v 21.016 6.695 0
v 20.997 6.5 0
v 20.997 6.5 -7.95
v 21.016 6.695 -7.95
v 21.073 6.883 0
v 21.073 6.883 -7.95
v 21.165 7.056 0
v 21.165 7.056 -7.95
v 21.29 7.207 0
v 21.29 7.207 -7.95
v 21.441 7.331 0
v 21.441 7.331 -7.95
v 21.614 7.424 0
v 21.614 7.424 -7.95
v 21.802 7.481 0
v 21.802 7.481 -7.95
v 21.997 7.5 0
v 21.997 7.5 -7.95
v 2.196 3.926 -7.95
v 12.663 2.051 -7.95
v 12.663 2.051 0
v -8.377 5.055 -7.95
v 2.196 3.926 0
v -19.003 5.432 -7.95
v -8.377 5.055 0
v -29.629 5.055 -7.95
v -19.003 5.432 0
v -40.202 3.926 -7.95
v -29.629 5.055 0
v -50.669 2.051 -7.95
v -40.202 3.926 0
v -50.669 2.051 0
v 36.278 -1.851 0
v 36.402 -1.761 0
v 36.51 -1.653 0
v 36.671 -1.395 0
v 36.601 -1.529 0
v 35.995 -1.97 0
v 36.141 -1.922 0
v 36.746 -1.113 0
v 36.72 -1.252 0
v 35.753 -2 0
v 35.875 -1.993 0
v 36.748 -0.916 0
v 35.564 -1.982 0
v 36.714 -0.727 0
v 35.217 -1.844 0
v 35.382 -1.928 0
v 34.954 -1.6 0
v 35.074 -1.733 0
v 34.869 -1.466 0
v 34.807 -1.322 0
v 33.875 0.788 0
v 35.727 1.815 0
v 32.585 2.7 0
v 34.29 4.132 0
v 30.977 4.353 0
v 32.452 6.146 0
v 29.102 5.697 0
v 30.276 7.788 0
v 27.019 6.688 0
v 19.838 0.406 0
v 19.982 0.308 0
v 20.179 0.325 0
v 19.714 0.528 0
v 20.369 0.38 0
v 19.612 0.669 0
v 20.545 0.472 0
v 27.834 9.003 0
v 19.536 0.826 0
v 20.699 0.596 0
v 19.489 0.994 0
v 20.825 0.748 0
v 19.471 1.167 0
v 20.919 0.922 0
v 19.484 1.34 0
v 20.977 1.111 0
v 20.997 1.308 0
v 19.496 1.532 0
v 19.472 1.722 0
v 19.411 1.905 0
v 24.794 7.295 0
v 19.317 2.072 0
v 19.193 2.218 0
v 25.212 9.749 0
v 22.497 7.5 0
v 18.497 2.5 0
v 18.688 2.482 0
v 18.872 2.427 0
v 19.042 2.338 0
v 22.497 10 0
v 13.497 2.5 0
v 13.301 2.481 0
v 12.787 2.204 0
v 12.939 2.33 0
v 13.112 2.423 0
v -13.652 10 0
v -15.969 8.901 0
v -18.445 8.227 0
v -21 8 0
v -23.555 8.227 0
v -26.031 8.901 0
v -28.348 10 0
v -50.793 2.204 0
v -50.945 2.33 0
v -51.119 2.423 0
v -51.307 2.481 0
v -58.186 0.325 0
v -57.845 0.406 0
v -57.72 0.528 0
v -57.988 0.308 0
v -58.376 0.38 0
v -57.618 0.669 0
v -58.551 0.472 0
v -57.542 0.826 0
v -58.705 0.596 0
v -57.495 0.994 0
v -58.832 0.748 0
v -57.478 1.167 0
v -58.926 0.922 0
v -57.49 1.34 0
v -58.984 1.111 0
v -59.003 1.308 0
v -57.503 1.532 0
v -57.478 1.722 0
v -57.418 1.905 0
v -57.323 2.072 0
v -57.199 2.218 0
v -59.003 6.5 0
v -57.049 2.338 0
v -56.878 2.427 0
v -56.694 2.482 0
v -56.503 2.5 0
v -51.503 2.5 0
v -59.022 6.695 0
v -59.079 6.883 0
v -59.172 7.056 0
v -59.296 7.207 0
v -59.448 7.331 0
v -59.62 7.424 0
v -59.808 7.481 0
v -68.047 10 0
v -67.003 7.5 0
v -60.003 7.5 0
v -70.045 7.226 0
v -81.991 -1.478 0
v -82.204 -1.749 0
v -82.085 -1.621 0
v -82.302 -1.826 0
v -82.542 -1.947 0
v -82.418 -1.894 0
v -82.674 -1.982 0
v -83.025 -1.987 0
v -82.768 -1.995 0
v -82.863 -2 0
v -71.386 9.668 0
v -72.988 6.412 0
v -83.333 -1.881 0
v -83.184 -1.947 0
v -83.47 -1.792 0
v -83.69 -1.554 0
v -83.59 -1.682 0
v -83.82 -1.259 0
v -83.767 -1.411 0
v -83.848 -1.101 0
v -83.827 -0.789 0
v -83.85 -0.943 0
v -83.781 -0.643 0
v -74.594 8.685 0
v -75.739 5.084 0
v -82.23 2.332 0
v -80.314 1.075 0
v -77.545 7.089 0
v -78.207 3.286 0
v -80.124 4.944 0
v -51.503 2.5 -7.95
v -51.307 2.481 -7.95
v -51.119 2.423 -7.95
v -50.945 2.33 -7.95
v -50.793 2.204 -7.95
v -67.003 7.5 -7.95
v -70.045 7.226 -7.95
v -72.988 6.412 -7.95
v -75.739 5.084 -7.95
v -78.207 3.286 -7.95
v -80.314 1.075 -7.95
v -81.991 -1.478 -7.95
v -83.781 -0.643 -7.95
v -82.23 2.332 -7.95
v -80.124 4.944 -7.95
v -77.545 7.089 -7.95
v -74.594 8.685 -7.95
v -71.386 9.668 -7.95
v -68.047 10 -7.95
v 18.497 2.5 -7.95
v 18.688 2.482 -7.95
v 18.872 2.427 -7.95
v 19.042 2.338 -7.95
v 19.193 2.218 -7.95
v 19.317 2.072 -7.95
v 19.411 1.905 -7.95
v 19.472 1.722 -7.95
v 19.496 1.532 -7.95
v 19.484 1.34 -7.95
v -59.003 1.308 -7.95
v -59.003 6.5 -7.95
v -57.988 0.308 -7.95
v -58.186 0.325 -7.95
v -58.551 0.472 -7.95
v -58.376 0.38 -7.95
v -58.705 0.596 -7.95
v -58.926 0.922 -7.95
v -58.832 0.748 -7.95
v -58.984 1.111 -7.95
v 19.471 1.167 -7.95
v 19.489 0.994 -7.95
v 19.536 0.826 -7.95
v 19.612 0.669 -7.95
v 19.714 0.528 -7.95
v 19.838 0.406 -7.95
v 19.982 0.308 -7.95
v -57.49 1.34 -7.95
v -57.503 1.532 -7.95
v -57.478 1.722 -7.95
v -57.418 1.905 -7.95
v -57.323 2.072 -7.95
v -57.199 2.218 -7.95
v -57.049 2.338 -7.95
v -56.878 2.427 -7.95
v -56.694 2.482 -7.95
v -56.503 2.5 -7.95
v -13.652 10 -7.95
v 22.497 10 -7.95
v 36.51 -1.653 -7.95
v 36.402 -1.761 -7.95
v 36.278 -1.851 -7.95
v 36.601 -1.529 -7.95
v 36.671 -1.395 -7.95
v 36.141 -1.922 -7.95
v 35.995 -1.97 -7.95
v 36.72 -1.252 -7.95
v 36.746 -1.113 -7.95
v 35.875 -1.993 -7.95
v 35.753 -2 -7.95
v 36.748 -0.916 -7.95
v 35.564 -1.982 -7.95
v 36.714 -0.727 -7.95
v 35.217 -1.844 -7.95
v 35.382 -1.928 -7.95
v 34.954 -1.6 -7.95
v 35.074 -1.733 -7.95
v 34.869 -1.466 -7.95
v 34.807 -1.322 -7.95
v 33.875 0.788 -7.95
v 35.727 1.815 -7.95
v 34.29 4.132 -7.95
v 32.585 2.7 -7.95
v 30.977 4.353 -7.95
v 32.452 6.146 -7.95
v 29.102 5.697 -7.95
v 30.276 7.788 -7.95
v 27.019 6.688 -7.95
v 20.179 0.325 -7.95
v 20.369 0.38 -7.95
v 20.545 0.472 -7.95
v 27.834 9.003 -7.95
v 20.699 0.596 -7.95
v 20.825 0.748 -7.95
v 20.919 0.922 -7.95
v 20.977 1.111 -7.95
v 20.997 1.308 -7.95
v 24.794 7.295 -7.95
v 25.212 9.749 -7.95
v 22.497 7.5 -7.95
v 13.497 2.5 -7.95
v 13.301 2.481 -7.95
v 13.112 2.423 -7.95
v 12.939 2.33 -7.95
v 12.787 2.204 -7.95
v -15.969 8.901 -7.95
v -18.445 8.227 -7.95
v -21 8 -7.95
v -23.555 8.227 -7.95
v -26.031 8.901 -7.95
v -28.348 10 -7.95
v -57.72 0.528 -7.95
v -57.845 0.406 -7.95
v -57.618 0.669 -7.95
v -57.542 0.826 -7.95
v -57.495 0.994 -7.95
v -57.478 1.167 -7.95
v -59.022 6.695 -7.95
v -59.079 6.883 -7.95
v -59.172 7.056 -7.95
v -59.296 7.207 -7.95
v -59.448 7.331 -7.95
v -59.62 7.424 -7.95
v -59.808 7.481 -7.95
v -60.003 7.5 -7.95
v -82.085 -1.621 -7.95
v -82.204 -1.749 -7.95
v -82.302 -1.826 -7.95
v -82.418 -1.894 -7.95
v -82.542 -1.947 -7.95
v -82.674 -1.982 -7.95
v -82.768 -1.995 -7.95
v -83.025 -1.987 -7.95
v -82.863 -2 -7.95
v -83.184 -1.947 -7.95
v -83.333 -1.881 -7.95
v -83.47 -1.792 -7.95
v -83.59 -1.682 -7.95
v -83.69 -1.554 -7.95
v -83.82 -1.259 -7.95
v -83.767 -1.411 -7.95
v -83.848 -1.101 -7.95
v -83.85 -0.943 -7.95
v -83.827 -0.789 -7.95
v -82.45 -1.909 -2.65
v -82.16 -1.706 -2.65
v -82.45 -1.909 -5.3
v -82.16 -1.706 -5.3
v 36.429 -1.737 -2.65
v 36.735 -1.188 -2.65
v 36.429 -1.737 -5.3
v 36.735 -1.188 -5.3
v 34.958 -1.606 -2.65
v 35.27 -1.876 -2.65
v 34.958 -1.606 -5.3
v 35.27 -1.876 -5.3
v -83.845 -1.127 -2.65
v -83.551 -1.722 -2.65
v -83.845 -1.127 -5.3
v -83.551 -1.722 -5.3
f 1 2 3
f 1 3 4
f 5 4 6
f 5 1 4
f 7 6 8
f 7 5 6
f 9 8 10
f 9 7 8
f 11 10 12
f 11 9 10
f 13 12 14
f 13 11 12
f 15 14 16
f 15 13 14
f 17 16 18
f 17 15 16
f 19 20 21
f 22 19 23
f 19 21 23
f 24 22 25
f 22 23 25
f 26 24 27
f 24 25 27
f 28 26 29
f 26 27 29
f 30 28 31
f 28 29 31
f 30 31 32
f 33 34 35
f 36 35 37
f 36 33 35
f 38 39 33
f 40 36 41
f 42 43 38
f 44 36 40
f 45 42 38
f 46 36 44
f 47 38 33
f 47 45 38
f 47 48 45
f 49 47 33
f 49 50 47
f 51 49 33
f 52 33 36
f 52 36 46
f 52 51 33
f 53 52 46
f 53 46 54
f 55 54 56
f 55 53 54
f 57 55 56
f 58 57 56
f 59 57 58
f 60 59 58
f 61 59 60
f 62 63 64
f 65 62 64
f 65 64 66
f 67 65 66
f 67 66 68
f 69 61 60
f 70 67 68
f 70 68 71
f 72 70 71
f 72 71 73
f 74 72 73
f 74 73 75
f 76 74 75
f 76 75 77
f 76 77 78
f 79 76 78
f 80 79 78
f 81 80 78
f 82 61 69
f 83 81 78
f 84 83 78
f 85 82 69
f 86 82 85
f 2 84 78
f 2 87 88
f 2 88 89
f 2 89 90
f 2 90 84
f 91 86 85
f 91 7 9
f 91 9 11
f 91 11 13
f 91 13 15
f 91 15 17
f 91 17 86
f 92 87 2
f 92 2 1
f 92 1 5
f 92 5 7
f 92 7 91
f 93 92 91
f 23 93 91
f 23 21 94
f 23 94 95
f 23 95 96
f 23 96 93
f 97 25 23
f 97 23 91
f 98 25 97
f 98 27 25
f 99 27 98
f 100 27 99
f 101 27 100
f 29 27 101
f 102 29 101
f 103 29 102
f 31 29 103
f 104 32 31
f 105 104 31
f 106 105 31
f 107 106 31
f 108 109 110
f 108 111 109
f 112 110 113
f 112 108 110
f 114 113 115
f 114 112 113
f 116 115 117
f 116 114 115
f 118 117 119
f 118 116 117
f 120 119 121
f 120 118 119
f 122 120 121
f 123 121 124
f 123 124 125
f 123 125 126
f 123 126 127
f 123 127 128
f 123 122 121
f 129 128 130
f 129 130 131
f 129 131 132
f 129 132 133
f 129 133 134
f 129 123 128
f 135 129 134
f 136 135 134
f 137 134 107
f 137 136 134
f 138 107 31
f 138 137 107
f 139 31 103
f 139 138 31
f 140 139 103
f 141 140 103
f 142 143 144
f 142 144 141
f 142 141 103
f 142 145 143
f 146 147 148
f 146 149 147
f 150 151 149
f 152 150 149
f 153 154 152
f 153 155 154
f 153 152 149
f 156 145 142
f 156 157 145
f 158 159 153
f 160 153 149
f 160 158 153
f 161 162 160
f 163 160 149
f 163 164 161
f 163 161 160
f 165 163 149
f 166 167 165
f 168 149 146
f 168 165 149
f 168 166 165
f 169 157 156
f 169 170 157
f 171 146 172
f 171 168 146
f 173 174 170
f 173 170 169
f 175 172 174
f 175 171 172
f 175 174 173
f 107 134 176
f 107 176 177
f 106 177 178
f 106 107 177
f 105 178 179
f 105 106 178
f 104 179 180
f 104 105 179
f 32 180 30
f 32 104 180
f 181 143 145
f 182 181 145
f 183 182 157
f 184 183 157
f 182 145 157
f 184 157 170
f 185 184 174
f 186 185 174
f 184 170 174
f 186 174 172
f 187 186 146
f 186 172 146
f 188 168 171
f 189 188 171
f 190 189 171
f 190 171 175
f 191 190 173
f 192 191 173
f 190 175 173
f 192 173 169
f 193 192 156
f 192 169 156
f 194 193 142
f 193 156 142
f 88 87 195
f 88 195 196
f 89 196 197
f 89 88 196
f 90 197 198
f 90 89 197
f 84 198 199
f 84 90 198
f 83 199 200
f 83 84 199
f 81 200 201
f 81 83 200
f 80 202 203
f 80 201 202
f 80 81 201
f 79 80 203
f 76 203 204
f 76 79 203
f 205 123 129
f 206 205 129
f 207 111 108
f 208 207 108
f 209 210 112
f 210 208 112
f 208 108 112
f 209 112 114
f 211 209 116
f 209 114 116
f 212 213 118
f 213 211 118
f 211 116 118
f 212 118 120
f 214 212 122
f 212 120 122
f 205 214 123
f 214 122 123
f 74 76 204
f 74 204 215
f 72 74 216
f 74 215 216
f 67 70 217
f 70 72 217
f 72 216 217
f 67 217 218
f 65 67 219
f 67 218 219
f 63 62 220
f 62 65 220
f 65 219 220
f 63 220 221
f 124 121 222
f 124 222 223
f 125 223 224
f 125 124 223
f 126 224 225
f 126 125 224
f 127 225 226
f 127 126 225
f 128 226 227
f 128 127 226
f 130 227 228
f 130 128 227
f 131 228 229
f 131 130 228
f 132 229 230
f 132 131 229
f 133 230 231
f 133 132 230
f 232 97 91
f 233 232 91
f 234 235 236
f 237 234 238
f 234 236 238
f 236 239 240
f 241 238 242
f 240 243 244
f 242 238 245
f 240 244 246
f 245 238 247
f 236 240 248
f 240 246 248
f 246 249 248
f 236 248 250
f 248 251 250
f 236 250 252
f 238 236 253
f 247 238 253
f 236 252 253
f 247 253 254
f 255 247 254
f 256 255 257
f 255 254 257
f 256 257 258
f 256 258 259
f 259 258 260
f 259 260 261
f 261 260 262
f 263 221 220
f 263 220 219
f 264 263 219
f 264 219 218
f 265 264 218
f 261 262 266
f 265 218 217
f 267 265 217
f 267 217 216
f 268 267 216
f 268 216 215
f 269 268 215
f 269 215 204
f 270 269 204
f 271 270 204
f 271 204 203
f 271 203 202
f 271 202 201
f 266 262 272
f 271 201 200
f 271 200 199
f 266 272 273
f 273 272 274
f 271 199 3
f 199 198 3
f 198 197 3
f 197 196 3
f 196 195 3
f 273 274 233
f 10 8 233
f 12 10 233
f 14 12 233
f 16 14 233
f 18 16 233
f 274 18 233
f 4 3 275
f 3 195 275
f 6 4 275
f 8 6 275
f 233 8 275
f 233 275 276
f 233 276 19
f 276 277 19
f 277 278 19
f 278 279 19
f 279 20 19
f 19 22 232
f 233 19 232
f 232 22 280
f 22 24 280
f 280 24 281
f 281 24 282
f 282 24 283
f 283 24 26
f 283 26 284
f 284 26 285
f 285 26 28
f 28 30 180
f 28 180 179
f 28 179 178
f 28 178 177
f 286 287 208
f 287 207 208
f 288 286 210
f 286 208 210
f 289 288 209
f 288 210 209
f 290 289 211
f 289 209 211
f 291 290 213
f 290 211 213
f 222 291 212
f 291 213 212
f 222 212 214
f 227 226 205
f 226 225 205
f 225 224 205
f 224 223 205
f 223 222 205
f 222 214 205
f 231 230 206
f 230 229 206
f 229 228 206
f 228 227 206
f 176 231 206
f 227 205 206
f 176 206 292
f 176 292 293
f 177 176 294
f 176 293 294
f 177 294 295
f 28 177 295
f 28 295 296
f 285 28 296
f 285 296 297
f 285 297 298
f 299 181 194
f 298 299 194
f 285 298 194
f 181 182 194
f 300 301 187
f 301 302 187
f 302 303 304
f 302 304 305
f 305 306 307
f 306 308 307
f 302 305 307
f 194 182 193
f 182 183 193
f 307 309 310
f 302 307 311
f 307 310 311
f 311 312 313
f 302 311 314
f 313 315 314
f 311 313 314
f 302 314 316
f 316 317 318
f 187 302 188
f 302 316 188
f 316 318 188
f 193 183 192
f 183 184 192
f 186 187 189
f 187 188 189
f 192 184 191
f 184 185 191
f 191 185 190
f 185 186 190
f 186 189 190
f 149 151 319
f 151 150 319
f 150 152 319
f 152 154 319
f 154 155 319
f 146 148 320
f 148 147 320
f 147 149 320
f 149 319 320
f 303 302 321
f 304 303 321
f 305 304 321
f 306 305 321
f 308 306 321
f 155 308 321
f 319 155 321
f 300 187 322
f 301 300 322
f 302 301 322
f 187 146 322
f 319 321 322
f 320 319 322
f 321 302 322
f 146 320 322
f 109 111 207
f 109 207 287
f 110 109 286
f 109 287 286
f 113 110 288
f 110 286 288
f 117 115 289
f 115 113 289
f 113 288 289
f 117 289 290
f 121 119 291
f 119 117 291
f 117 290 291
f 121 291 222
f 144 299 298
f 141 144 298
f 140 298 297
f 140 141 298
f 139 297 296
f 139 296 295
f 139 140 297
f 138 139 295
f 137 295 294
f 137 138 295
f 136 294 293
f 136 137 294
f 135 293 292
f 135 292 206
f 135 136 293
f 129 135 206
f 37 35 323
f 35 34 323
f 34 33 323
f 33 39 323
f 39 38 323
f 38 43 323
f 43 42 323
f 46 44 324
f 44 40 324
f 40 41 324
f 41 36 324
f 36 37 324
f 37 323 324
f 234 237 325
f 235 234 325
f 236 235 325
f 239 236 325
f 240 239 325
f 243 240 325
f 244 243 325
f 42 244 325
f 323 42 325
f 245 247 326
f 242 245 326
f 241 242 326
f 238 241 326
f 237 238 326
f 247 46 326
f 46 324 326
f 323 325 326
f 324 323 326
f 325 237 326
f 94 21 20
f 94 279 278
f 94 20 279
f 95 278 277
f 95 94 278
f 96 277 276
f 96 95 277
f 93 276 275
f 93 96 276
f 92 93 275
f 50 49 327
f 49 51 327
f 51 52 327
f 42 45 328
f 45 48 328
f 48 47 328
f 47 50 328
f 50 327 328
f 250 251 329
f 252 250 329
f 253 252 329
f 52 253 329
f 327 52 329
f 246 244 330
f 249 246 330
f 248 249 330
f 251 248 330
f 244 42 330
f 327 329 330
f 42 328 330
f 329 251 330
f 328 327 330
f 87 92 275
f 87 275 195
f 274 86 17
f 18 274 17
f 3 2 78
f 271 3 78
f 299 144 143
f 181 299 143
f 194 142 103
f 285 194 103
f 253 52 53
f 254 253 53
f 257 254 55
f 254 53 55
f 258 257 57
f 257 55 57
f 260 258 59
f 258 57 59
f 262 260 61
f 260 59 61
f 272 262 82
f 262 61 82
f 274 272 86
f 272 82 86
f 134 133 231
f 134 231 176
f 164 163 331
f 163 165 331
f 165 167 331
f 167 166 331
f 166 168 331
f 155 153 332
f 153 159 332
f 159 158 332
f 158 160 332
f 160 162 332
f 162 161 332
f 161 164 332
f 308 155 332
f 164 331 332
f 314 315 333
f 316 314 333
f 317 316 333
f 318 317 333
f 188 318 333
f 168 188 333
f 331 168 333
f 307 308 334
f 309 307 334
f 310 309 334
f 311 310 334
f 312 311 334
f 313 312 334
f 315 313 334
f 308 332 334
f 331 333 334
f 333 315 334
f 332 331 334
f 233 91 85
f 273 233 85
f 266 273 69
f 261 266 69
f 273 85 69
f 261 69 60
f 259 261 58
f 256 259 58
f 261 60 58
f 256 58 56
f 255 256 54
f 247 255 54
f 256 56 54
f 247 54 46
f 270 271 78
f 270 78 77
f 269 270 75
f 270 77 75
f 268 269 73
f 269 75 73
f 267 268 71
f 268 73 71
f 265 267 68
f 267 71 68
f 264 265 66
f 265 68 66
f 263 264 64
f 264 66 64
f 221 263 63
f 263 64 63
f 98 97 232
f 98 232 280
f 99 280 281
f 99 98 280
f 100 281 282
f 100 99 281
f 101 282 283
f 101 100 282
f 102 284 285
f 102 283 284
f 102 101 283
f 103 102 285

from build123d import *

# Parameters (mm, degrees)
EXTRUDE_1219_DEPTH     = 7.95
CUT_EXTRUDE_1748_DEPTH = 86.222223289
FILLET_1_R             = 1
CUT_EXTRUDE_3045_DEPTH = 86.222223289
FILLET_START           = -9
FILLET_2_DEPTH         = 10
FILLET_3_DEPTH         = 10


with BuildPart() as part:
    # Эскиз1 → Extrude 1219 (new body)
    with BuildSketch(Plane.XY):
        with BuildLine():
            Line((-59.003125249, 0), (-59.003125249, 7.5))
            Line((-59.003125249, 7.5), (-67.003125249, 7.5))
            ThreePointArc((-67.003125249, 7.5), (-75.989225627, 4.93086969), (-82.259271551, -2))
            Line((-82.259271551, -2), (-84.259271551, -2))
            ThreePointArc((-84.259271551, -2), (-78.132206164, 6.673633304), (-68.047161318, 10))
            Line((-68.047161318, 10), (0, 10))
            Line((0, 10), (22.496874751, 10))
            ThreePointArc((22.496874751, 10), (31.915339808, 6.61174951), (37.016858777, -2))
            Line((37.016858777, -2), (35.016858777, -2))
            ThreePointArc((35.016858777, -2), (30.354991574, 4.856157589), (22.496874751, 7.5))
            Line((22.496874751, 7.5), (20.996874751, 7.5))
            Line((20.996874751, 7.5), (20.996874751, 0))
            ThreePointArc((20.996874751, 0), (-19.003125249, 5.431677052), (-59.003125249, 0))
        make_face()
    extrude(amount=-EXTRUDE_1219_DEPTH)

    # Эскиз4 → Cut-Extrude 1748 (cut, through all)
    with BuildSketch(Plane.XY):
        with BuildLine():
            Line((-56.503125249, 2.5), (-51.503125249, 2.5))
            ThreePointArc((-51.503125249, 2.5), (-50.503125249, 1.5), (-51.503125249, 0.5))
            Line((-51.503125249, 0.5), (-56.503125249, 0.5))
            ThreePointArc((-56.503125249, 0.5), (-57.503125249, 1.5), (-56.503125249, 2.5))
        make_face()
        with BuildLine():
            Line((13.496874751, 2.5), (18.496874751, 2.5))
            ThreePointArc((18.496874751, 2.5), (19.496874751, 1.5), (18.496874751, 0.5))
            Line((18.496874751, 0.5), (13.496874751, 0.5))
            ThreePointArc((13.496874751, 0.5), (12.496874751, 1.5), (13.496874751, 2.5))
        make_face()
    extrude(amount=-CUT_EXTRUDE_1748_DEPTH, mode=Mode.SUBTRACT)

    # Скругление1
    # the kernel refuses this fillet: 1 mm, written as the material it adds along each edge
    with BuildSketch(Plane(origin=(20.996874751, 7.5, 0), x_dir=(0, -1, 0), z_dir=(0, 0, -1))) as fillet_1_piece_1:
        with BuildLine():
            CenterArc((FILLET_1_R, -FILLET_1_R), FILLET_1_R, 90, 90)
            Line((0, -FILLET_1_R), (0, 0))
            Line((0, 0), (FILLET_1_R, 0))
        make_face()
    extrude(amount=7.95)
    with BuildSketch(Plane(origin=(-59.003125249, 7.5, 0), x_dir=(0, -1, 0), z_dir=(0, 0, -1))) as fillet_1_piece_2:
        with BuildLine():
            CenterArc((FILLET_1_R, FILLET_1_R), FILLET_1_R, 180, 90)
            Line((0, FILLET_1_R), (0, 0))
            Line((0, 0), (FILLET_1_R, 0))
        make_face()
    extrude(amount=7.95)
    # the kernel refuses this fillet: 1 mm, written as the material it takes off along each edge
    with BuildSketch(Plane(origin=(20.996874751, 0, 3.270843206), x_dir=(-0.9649388241572373, 0.26247488572061173, 0), z_dir=(0, 0, -1))) as fillet_1_2_piece_1:
        with BuildLine():
            CenterArc((1.308344503, 0.999990553), FILLET_1_R, 164.783036074, 104.967917899)
            Line((0.343405679, 1.262465439), (0, 0))
            ThreePointArc((0, 0), (0.651998922, 0.001417015), (1.303997843, 0))
        make_face()
    extrude(amount=14.491686412, mode=Mode.SUBTRACT)
    with BuildSketch(Plane(origin=(-59.003125249, 0, 3.270843206), x_dir=(0, 1, 0), z_dir=(0, 0, -1))) as fillet_1_2_piece_2:
        with BuildLine():
            CenterArc((1.308337282, 1), FILLET_1_R, 165.032082101, 104.967917899)
            ThreePointArc((0.342266685, 1.258278146), (0.172500676, 0.628767142), (0, 0))
            Line((0, 0), (1.308337282, 0))
        make_face()
    extrude(amount=14.491686412, mode=Mode.SUBTRACT)
    with BuildSketch(Plane(origin=(18.869217353, 0.571904645, -11.41789989), x_dir=(0.6247425525309795, 0.7808308030918583, 0), z_dir=(0, 0, 1))) as fillet_1_2_piece_3:
        with BuildLine():
            CenterArc((1.476201521, -0.870557233), FILLET_1_R, 119.476541698, 84.032444608)
            ThreePointArc((0.559203998, -1.26945013), (0.281069449, -0.63407864), (0, 0))
            ThreePointArc((0, 0), (0.492067174, -0.129442767), (0.984134348, 0))
        make_face()
    extrude(amount=14.88579978, mode=Mode.SUBTRACT)
    with BuildSketch(Plane(origin=(-56.87546785, 0.571904645, -11.41789989), x_dir=(-0.9664237291257997, -0.2569536452019758, 0), z_dir=(0, 0, 1))) as fillet_1_2_piece_4:
        with BuildLine():
            CenterArc((1.391783822, -0.99998931), FILLET_1_R, 90.264928981, 84.032444608)
            ThreePointArc((0.396732806, -0.900623947), (0.316825083, -0.398129879), (0, 0))
            ThreePointArc((0, 0), (0.693579978, -0.001603519), (1.387159956, 0))
        make_face()
    extrude(amount=14.88579978, mode=Mode.SUBTRACT)

    # Эскиз3 → Cut-Extrude 3045 (cut, through all)
    with BuildSketch(Plane.XY):
        with BuildLine():
            Line((-28.348469228, 10), (-13.651530772, 10))
            ThreePointArc((-13.651530772, 10), (-21, 8), (-28.348469228, 10))
        make_face()
    extrude(amount=-CUT_EXTRUDE_3045_DEPTH, mode=Mode.SUBTRACT)

    # Скругление2: read off the stored shape, not the designer's step
    # Скругление2 outline → Скругление2 (cut)
    with BuildSketch(Plane.XY.offset(FILLET_START)):
        with BuildLine():
            add(Edge.make_bspline(
                [(-82.863119301, -2), (-82.449925955, -1.99999996), (-82.147973363, -1.770582651), (-81.991237502, -1.477750248)],
                knots=[0.617138018, 0.617138018, 0.617138018, 0.617138018, 1, 1, 1, 1], degree=3, weights=[0.553450152, 0.609956112, 0.758806062, 1]))
            Line((-82.863119301, -2), (-82.259271551, -2))
            ThreePointArc((-82.259271551, -2), (-82.127508876, -1.737718125), (-81.991237502, -1.477750248))
        make_face()
        with BuildLine():
            add(Edge.make_bspline(
                [(-83.781008367, -0.643067451), (-84.028353334, -1.25998415), (-83.741746006, -2.000000086), (-82.863119301, -2)],
                knots=[0, 0, 0, 0, 0.617138018, 0.617138018, 0.617138018, 0.617138018], degree=3, weights=[1, 0.611217733, 0.462367784, 0.553450152]))
            ThreePointArc((-83.781008367, -0.643067451), (-84.03454269, -1.316457352), (-84.259271551, -2))
            Line((-84.259271551, -2), (-82.863119301, -2))
        make_face()
    extrude(amount=FILLET_2_DEPTH, mode=Mode.SUBTRACT)

    # Скругление3: read off the stored shape, not the designer's step
    # Скругление3 outline → Скругление3 (cut)
    with BuildSketch(Plane.XY.offset(FILLET_START)):
        with BuildLine():
            add(Edge.make_bspline(
                [(35.753175475, -2), (36.580087454, -2.000000006), (36.88300902, -1.319995015), (36.713739215, -0.726922424)],
                knots=[0.42186979, 0.42186979, 0.42186979, 0.42186979, 1, 1, 1, 1], degree=3, weights=[0.524198025, 0.465452398, 0.624053056, 1]))
            Line((35.753175475, -2), (37.016858777, -2))
            ThreePointArc((37.016858777, -2), (36.879391808, -1.360105716), (36.713739215, -0.726922424))
        make_face()
        with BuildLine():
            add(Edge.make_bspline(
                [(34.80724517, -1.32210817), (34.931629097, -1.688611726), (35.257891746, -1.999999996), (35.753175475, -2)],
                knots=[0, 0, 0, 0, 0.42186979, 0.42186979, 0.42186979, 0.42186979], degree=3, weights=[1, 0.725666199, 0.567065541, 0.524198025]))
            ThreePointArc((34.80724517, -1.32210817), (34.916677882, -1.65962369), (35.016858777, -2))
            Line((35.016858777, -2), (35.753175475, -2))
        make_face()
    extrude(amount=FILLET_3_DEPTH, mode=Mode.SUBTRACT)


solid = part.part
